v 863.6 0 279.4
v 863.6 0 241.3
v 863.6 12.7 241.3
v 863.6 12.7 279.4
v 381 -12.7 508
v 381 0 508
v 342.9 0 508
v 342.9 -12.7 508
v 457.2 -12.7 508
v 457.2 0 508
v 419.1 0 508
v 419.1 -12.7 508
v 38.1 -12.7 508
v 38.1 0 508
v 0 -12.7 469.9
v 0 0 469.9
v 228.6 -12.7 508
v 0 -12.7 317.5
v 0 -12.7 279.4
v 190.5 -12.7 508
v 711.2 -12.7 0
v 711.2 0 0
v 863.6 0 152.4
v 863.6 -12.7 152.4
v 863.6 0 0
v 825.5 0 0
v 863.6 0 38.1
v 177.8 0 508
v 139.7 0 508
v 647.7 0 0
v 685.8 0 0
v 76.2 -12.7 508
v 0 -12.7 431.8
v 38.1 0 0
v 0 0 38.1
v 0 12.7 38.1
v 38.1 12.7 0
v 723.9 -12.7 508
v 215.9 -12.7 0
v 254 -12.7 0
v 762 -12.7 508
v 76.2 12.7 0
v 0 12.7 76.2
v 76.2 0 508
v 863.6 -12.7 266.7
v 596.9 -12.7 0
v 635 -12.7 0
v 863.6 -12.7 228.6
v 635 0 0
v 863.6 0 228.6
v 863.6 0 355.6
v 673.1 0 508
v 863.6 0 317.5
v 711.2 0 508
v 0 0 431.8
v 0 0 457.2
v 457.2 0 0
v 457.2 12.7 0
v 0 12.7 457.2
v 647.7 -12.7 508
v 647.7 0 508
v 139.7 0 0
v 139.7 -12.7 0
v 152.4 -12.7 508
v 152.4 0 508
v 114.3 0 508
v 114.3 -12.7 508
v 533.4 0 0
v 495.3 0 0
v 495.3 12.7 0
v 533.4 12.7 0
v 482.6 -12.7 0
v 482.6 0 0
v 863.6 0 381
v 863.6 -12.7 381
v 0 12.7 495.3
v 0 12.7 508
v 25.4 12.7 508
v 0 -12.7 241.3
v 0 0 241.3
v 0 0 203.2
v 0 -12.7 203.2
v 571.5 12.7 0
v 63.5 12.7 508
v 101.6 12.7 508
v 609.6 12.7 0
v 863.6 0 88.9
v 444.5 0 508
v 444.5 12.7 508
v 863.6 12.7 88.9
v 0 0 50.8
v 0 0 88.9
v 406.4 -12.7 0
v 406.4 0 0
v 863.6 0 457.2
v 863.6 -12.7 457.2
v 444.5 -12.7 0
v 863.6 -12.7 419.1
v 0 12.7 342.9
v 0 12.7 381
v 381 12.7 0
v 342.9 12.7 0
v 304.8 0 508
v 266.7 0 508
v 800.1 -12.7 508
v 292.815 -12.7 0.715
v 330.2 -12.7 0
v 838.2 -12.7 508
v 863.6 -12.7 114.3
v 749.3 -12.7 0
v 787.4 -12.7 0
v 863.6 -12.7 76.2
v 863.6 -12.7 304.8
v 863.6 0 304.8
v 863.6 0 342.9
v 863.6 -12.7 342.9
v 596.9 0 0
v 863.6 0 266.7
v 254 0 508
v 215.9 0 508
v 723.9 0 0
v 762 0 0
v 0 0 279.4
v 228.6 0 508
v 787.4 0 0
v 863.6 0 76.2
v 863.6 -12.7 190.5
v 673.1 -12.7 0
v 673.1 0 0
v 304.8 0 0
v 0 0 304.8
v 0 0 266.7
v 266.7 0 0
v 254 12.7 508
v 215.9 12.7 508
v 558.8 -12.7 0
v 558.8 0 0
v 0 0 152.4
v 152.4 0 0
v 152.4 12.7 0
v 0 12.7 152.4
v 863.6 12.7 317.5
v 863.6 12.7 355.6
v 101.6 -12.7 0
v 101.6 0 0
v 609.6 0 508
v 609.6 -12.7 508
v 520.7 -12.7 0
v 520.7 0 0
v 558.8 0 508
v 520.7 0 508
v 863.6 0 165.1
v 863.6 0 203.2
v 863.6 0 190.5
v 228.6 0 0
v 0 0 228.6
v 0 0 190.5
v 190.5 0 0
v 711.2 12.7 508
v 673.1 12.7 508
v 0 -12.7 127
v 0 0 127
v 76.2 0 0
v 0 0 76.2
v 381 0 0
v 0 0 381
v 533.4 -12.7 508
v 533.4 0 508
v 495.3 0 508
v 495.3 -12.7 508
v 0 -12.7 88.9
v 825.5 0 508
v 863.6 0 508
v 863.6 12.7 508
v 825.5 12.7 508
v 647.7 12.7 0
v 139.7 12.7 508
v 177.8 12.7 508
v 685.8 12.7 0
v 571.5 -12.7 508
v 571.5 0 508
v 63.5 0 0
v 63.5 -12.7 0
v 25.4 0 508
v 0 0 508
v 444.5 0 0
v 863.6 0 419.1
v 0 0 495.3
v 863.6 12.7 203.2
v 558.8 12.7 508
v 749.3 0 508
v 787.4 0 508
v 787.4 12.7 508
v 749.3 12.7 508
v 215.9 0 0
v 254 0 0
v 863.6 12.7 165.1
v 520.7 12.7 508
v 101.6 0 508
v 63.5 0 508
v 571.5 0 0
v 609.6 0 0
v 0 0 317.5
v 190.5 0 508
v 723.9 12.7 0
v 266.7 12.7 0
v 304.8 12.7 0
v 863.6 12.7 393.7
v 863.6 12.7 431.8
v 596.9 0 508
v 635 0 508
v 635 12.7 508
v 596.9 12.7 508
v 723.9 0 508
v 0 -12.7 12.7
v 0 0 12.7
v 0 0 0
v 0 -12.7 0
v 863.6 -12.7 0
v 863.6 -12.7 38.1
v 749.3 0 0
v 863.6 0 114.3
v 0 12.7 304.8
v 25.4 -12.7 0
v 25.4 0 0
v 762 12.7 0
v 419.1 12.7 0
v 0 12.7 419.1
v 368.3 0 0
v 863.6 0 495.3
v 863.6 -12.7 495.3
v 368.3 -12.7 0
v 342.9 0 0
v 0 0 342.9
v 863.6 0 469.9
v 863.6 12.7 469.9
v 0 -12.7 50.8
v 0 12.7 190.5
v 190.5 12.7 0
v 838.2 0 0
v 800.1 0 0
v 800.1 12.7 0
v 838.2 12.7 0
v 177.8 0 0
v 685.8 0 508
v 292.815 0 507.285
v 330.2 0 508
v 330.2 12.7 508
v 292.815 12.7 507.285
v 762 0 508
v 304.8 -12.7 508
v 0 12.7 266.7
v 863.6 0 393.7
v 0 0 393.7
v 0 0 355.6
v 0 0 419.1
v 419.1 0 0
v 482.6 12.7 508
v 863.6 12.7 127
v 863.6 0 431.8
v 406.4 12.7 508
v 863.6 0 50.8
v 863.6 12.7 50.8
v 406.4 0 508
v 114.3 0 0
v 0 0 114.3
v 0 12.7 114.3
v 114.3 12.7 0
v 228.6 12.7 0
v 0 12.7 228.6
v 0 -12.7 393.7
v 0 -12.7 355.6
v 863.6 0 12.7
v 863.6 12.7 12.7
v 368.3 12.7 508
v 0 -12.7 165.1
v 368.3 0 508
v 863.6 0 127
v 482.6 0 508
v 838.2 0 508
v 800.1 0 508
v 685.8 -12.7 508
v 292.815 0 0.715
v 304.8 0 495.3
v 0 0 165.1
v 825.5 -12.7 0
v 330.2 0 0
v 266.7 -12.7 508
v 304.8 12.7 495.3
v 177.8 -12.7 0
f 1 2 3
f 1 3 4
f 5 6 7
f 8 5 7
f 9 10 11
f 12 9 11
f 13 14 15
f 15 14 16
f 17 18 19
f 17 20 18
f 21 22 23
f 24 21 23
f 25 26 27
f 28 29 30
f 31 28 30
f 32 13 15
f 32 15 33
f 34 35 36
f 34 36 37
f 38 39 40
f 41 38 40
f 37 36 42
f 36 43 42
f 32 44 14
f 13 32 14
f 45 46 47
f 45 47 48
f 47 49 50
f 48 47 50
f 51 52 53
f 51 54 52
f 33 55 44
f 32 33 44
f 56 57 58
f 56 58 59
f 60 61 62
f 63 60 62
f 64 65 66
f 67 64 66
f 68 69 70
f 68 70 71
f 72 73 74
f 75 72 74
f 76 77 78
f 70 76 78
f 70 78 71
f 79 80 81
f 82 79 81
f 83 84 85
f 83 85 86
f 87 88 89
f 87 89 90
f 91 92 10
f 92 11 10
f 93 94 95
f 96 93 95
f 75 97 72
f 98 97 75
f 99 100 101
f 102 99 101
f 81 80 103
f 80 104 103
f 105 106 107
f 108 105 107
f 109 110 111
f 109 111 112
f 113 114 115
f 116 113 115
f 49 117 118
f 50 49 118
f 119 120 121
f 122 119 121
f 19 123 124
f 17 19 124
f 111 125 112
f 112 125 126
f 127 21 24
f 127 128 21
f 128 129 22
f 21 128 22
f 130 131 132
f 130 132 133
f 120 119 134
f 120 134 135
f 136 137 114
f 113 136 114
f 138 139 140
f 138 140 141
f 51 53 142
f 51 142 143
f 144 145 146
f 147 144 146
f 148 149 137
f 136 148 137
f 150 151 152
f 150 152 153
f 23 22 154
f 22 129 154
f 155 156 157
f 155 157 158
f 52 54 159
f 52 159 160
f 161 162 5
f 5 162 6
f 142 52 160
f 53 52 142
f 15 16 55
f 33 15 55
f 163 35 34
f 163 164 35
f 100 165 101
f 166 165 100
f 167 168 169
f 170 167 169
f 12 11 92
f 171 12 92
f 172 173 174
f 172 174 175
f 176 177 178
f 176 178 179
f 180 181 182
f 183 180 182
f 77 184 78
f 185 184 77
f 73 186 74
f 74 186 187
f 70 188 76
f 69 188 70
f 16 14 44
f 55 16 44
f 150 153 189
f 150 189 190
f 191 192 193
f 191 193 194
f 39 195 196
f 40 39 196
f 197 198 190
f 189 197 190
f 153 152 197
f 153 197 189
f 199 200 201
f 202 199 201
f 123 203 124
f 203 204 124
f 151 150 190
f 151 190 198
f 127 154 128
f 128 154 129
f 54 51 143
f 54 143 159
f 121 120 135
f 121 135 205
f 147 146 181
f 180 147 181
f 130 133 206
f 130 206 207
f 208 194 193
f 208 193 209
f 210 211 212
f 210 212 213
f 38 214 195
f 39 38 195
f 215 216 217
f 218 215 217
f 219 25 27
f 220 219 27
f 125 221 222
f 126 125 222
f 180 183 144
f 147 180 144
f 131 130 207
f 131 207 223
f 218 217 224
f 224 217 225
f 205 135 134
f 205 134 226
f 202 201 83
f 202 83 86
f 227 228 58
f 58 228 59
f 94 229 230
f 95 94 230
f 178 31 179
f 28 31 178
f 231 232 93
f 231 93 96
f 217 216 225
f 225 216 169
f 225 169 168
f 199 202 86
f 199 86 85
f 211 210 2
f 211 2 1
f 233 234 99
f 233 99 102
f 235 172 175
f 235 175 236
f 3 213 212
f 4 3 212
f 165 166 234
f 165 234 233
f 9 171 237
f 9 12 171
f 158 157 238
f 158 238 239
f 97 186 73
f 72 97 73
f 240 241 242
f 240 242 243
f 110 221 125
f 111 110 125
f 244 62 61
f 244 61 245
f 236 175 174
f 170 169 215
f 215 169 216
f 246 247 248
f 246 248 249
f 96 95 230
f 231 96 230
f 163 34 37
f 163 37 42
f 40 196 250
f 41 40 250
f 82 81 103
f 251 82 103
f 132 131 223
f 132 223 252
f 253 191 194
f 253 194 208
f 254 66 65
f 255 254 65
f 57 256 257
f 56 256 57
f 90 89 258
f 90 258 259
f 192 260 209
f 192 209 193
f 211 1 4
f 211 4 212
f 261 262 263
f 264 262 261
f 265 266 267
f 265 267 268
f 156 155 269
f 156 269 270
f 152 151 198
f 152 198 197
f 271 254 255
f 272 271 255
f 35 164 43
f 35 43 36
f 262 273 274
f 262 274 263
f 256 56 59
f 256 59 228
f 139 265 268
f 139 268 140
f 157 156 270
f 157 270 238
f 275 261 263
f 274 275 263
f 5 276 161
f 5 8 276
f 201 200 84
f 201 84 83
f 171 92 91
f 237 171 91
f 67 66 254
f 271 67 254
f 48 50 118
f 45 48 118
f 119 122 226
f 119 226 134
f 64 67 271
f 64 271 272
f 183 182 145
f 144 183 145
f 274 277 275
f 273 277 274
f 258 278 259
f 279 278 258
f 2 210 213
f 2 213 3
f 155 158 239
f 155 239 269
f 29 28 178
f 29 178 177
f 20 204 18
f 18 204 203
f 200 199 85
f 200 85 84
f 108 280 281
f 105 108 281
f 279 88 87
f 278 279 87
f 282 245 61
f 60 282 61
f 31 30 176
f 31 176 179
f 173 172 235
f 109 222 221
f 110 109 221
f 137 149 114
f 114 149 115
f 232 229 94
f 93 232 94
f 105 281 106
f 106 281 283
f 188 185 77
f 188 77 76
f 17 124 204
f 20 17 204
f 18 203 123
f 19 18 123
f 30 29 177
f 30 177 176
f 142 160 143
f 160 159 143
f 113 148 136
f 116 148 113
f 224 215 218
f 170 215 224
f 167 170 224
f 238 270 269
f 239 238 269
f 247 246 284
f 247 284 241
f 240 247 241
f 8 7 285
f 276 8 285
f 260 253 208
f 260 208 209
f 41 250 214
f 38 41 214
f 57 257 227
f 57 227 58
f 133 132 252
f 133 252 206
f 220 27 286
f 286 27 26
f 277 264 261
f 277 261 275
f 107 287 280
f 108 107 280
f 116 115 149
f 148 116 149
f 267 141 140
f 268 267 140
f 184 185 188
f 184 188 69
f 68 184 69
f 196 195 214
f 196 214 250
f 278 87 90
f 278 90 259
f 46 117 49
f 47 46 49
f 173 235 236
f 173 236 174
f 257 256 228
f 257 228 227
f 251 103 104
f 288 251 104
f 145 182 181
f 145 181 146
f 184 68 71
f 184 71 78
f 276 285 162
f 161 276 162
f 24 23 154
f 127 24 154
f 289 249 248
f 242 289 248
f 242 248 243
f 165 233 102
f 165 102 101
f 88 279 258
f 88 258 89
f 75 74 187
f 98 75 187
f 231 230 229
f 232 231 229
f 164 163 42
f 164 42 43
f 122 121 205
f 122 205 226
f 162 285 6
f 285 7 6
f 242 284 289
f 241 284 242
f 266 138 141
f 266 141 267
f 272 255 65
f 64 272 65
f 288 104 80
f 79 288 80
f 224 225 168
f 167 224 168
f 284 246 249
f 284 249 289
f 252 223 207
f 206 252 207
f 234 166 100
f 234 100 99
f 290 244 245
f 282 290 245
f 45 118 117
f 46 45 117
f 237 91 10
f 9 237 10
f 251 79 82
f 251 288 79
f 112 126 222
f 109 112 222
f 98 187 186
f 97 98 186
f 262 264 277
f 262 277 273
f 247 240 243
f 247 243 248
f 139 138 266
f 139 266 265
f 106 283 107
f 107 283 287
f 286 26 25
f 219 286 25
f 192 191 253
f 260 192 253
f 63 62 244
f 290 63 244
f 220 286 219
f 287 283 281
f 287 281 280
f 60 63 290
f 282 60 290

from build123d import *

# Parameters (mm, degrees)
F1_DEPTH = 12.7
F3_DEPTH = 12.7


with BuildPart() as f1:
    # F0 (on Front) → F1 (new body)
    with BuildSketch(Plane.XZ):
        Polygon((0, 12.7), (0, 0), (25.4, 0), (38.1, 12.7), (190.5, 165.1), (381, 355.6), (419.1, 393.7), (533.4, 508), (495.3, 508), (381, 393.7), (190.5, 203.2), align=None)
        Polygon((76.2, 508), (38.1, 508), (0, 469.9), (0, 431.8), align=None)
        Polygon((0, 355.6), (38.1, 393.7), (152.4, 508), (114.3, 508), (0, 393.7), align=None)
        Polygon((0, 317.5), (0, 279.4), (190.5, 469.9), (228.6, 508), (190.5, 508), align=None)
        Polygon((0, 241.3), (0, 203.2), (190.5, 393.7), (304.8, 508), (266.7, 508), (190.5, 431.8), align=None)
        Polygon((0, 165.1), (0, 127), (190.5, 317.5), (381, 508), (342.9, 508), (228.6, 393.7), (190.5, 355.6), align=None)
        Polygon((0, 88.9), (0, 50.8), (190.5, 241.3), (381, 431.8), (457.2, 508), (419.1, 508), (381, 469.9), (190.5, 279.4), align=None)
        Polygon((190.5, 127), (76.2, 12.7), (63.5, 0), (101.6, 0), (114.3, 12.7), (190.5, 88.9), (381, 279.4), (571.5, 469.9), (609.6, 508), (571.5, 508), (381, 317.5), align=None)
        Polygon((190.5, 50.8), (152.4, 12.7), (139.7, 0), (177.8, 0), (190.5, 12.7), (381, 203.2), (571.5, 393.7), (685.8, 508), (647.7, 508), (571.5, 431.8), (381, 241.3), align=None)
        Polygon((571.5, 355.6), (381, 165.1), (228.6, 12.7), (215.9, 0), (254, 0), (266.7, 12.7), (381, 127), (571.5, 317.5), (762, 508), (723.9, 508), (609.6, 393.7), align=None)
        Polygon((330.2, 0), (342.9, 12.7), (381, 50.8), (571.5, 241.3), (762, 431.8), (838.2, 508), (800.1, 508), (762, 469.9), (571.5, 279.4), (381, 88.9), (304.8, 12.7), (292.814841, 0.714841), align=None)
        Polygon((571.5, 203.2), (381, 12.7), (368.3, 0), (381, 0), (406.4, 0), (419.1, 12.7), (571.5, 165.1), (762, 355.6), (800.1, 393.7), (863.6, 457.2), (863.6, 495.3), (762, 393.7), align=None)
        Polygon((571.5, 127), (457.2, 12.7), (444.5, 0), (482.6, 0), (495.3, 12.7), (571.5, 88.9), (762, 279.4), (863.6, 381), (863.6, 419.1), (762, 317.5), align=None)
        Polygon((571.5, 50.8), (533.4, 12.7), (520.7, 0), (558.8, 0), (571.5, 12.7), (762, 203.2), (863.6, 304.8), (863.6, 342.9), (762, 241.3), align=None)
        Polygon((863.6, 266.7), (762, 165.1), (609.6, 12.7), (596.9, 0), (635, 0), (647.7, 12.7), (762, 127), (863.6, 228.6), align=None)
        Polygon((711.2, 0), (723.9, 12.7), (762, 50.8), (863.6, 152.4), (863.6, 190.5), (762, 88.9), (685.8, 12.7), (673.1, 0), align=None)
        Polygon((863.6, 114.3), (762, 12.7), (749.3, 0), (762, 0), (787.4, 0), (800.1, 12.7), (863.6, 76.2), align=None)
        Polygon((863.6, 38.1), (838.2, 12.7), (825.5, 0), (863.6, 0), align=None)
    extrude(amount=F1_DEPTH)


with BuildPart() as f3:
    # F2 (on Front) → F3 (new body)
    with BuildSketch(Plane.XZ):
        Polygon((177.8, 508), (139.7, 508), (152.4, 495.3), (190.5, 457.2), (381, 266.7), (571.5, 76.2), (647.7, 0), (685.8, 0), (571.5, 114.3), (381, 304.8), (190.5, 495.3), align=None)
        Polygon((101.6, 508), (63.5, 508), (76.2, 495.3), (190.5, 381), (381, 190.5), (571.5, 0), (609.6, 0), (571.5, 38.1), (381, 228.6), (190.5, 419.1), (114.3, 495.3), align=None)
        Polygon((25.4, 508), (0, 508), (0, 495.3), (190.5, 304.8), (381, 114.3), (495.3, 0), (533.4, 0), (419.1, 114.3), (381, 152.4), (190.5, 342.9), (38.1, 495.3), align=None)
        Polygon((673.1, 508), (685.8, 495.3), (762, 419.1), (863.6, 317.5), (863.6, 355.6), (762, 457.2), (723.9, 495.3), (711.2, 508), align=None)
        Polygon((406.4, 508), (381, 508), (368.3, 508), (381, 495.3), (571.5, 304.8), (762, 114.3), (863.6, 12.7), (863.6, 50.8), (800.1, 114.3), (762, 152.4), (571.5, 342.9), (419.1, 495.3), align=None)
        Polygon((444.5, 508), (457.2, 495.3), (571.5, 381), (762, 190.5), (863.6, 88.9), (863.6, 127), (762, 228.6), (571.5, 419.1), (495.3, 495.3), (482.6, 508), align=None)
        Polygon((787.4, 508), (762, 508), (749.3, 508), (762, 495.3), (863.6, 393.7), (863.6, 431.8), (800.1, 495.3), align=None)
        Polygon((635, 508), (596.9, 508), (609.6, 495.3), (762, 342.9), (863.6, 241.3), (863.6, 279.4), (762, 381), (647.7, 495.3), align=None)
        Polygon((825.5, 508), (838.2, 495.3), (863.6, 469.9), (863.6, 508), align=None)
        Polygon((520.7, 508), (533.4, 495.3), (571.5, 457.2), (762, 266.7), (863.6, 165.1), (863.6, 203.2), (762, 304.8), (571.5, 495.3), (558.8, 508), align=None)
        Polygon((381, 381), (266.7, 495.3), (254, 508), (215.9, 508), (228.6, 495.3), (381, 342.9), (571.5, 152.4), (609.6, 114.3), (723.9, 0), (762, 0), (571.5, 190.5), align=None)
        Polygon((381, 457.2), (342.9, 495.3), (330.2, 508), (292.814842, 507.285159), (304.8, 495.3), (381, 419.1), (571.5, 228.6), (762, 38.1), (800.1, 0), (838.2, 0), (762, 76.2), (571.5, 266.7), align=None)
        Polygon((381, 38.1), (419.1, 0), (457.2, 0), (381, 76.2), (190.5, 266.7), (0, 457.2), (0, 419.1), (190.5, 228.6), align=None)
        Polygon((0, 228.6), (0, 190.5), (190.5, 0), (228.6, 0), (190.5, 38.1), align=None)
        Polygon((190.5, 190.5), (0, 381), (0, 342.9), (190.5, 152.4), (228.6, 114.3), (342.9, 0), (381, 0), align=None)
        Polygon((190.5, 114.3), (0, 304.8), (0, 266.7), (190.5, 76.2), (266.7, 0), (304.8, 0), align=None)
        Polygon((38.1, 114.3), (0, 152.4), (0, 114.3), (114.3, 0), (152.4, 0), align=None)
        Polygon((0, 38.1), (38.1, 0), (76.2, 0), (0, 76.2), align=None)
    extrude(amount=-F3_DEPTH)


solid = Compound([f1.part, f3.part])
